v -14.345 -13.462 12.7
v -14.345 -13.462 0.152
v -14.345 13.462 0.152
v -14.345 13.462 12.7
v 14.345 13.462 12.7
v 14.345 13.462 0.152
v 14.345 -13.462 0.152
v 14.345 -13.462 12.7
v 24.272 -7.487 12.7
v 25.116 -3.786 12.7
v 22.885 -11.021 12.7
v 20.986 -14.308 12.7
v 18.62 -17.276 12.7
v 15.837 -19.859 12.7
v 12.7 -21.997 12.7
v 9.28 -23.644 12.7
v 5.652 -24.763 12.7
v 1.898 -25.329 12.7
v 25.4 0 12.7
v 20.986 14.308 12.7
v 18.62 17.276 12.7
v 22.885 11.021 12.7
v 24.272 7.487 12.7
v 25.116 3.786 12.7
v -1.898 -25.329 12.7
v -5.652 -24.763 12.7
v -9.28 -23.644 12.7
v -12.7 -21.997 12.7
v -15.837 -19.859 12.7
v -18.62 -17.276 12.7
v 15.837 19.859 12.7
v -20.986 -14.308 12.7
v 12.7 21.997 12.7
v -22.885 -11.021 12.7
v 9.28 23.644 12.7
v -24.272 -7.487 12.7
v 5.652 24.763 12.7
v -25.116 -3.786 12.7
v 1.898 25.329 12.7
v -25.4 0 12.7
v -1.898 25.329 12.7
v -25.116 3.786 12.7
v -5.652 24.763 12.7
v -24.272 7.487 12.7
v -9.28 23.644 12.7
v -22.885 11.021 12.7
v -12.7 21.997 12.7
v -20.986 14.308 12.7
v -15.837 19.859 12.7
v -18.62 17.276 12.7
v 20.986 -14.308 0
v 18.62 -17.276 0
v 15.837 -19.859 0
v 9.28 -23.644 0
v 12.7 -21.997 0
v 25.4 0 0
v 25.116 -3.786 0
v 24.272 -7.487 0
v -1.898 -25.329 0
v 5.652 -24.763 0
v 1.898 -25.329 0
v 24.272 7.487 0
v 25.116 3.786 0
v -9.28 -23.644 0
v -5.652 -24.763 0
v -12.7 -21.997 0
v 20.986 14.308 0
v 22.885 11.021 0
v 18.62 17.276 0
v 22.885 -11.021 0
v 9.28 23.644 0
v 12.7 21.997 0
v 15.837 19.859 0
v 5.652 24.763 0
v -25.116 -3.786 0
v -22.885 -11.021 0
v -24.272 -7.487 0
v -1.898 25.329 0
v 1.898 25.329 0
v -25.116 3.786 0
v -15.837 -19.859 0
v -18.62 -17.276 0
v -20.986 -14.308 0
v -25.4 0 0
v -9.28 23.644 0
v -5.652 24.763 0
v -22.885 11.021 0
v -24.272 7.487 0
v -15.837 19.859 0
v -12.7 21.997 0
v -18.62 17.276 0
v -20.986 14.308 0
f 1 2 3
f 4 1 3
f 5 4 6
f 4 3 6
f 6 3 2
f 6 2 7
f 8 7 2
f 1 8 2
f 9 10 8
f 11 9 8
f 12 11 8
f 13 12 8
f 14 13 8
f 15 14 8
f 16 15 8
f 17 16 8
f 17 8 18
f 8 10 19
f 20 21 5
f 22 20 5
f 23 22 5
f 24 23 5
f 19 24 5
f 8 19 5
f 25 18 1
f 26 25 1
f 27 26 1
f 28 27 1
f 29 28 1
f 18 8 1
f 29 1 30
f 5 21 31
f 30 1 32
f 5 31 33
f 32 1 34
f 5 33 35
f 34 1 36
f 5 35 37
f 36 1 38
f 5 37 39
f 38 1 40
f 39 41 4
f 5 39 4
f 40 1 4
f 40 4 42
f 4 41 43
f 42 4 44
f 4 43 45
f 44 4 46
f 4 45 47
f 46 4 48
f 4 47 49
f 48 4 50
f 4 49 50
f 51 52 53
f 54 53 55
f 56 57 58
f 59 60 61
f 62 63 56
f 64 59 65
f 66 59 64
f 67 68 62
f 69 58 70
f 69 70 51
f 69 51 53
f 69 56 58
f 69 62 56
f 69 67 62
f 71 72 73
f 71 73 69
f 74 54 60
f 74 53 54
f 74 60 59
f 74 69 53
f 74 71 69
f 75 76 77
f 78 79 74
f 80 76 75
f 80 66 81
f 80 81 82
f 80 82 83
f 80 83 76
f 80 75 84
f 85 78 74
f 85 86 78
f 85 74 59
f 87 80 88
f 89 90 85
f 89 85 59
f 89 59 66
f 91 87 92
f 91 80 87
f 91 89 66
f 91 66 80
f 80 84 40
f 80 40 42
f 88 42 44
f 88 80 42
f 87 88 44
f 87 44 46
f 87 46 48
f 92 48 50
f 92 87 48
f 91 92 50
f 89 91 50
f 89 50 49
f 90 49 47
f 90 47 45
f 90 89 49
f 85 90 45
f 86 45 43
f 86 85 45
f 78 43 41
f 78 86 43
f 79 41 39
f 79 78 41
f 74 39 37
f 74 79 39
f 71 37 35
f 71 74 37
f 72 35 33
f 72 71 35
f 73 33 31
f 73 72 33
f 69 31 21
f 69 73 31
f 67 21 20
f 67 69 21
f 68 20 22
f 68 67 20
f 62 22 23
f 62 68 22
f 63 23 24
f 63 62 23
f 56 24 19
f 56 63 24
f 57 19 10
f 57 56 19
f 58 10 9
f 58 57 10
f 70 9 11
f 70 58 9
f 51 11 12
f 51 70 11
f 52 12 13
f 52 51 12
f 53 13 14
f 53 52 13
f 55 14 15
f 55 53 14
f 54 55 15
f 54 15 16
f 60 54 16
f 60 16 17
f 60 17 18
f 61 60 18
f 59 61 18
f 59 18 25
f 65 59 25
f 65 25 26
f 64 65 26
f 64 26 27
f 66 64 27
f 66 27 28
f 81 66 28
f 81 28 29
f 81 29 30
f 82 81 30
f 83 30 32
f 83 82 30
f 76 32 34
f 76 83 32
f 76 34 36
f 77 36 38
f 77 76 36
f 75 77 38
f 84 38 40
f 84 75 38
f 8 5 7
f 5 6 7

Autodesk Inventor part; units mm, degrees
ref_plane "YZ Plane" through (0, 0, 0) normal (1, 0, 0) x (0, 1, 0)
ref_plane "XZ Plane" through (0, 0, 0) normal (0, 1, 0) x (-1, 0, 0)
ref_plane "XY Plane" through (0, 0, 0) normal (0, 0, 1) x (1, 0, 0)
sketch "Sketch1" plane through (0, 0, 0) normal (0, 0, 1) x (1, 0, 0)
  line L0 (-14.3446, 13.462) -> (14.3446, 13.462)
  line L1 (14.3446, 13.462) -> (14.3446, -13.462)
  line L2 (14.3446, -13.462) -> (-14.3446, -13.462)
  line L3 (-14.3446, -13.462) -> (-14.3446, 13.462)
  line L4 (-14.3446, 13.462) -> (14.3446, -13.462) construction
  line L5 (14.3446, 13.462) -> (-14.3446, -13.462) construction
  point P0 (0, 0)
  dimension "d0" = 28.6893
  dimension "d1" = 26.924
ref_plane "Work Plane1" through (0, 0, 0) normal (0, 0, -1) x (-1, 0, 0)
sketch "Sketch2" plane through (0, 0, 0) normal (0, 0, -1) x (-1, 0, 0)
  circle A0 centre (0, 0) radius 25.4
  dimension "d4" = 50.8
extrude "Extrusion2" add sketch "Sketch2" against normal blind 12.7
extrude "Extrusion3" cut sketch "Sketch1" along normal through all
sketch "Sketch3" plane through (0, 0, 0) normal (0, 0, 1) x (1, 0, 0)
  line L0 (-14.3446, -13.462) -> (14.3446, -13.462) projected
  line L1 (-14.3446, 13.462) -> (-14.3446, -13.462) projected
  line L2 (14.3446, 13.462) -> (-14.3446, 13.462) projected
  line L3 (14.3446, -13.462) -> (14.3446, 13.462) projected
  line L4 (-14.3446, 13.462) -> (-14.3446, -13.462) projected
  line L5 (-14.3446, -13.462) -> (14.3446, -13.462) projected
  line L6 (14.3446, -13.462) -> (14.3446, 13.462) projected
  line L7 (14.3446, 13.462) -> (-14.3446, 13.462) projected
  circle A0 centre (0, 0) radius 25.4 projected
  line L8 (-35.56, 0) -> (35.56, 0) projected
  line L9 (0, -35.56) -> (0, 35.56) projected
  line L10 (14.3446, 13.462) -> (-14.3446, 13.462) projected
  line L11 (-14.3446, -13.462) -> (14.3446, -13.462)
  line L12 (14.3446, -13.462) -> (14.3446, 13.462)
  line L13 (14.3446, 13.462) -> (-14.3446, 13.462)
  line L14 (-14.3446, 13.462) -> (-14.3446, -13.462)
  line L15 (-14.3446, -13.462) -> (14.3446, 13.462) construction
  line L16 (14.3446, -13.462) -> (-14.3446, 13.462) construction
  line L17 (14.3446, 13.462) -> (-14.3446, 13.462) projected
  line L18 (-14.3446, -13.462) -> (14.3447, -13.462)
  line L19 (14.3447, -13.462) -> (14.3446, 13.462)
  line L20 (14.3446, 13.462) -> (-14.3446, 13.462)
  line L21 (-14.3446, 13.462) -> (-14.3446, -13.462)
  line L22 (-14.3446, -13.462) -> (14.3446, 13.462) construction
  line L23 (14.3447, -13.462) -> (-14.3446, 13.462) construction
  line L24 (14.3446, -13.462) -> (14.3446, 13.462) projected
extrude "Extrusion4" add sketch "Sketch3" along normal blind 0.1524 contours L1 L8 L9 L0 | L9 L8 L3 L0 | L1 L2 L9 L8 | L9 L2 L3 L8
pattern_linear "Rectangular Pattern1" [suppressed]
sketch "Sketch4" plane through (0, 0, 0) normal (0, 0, 1) x (1, 0, 0)
  circle A0 centre (0, 0) radius 25.4 projected
  line L0 (-35.56, 0) -> (35.56, 0) projected
  line L1 (0, -35.56) -> (0, 35.56) projected
  line L2 (-14.3446, -13.462) -> (14.3446, -13.462) projected
  line L3 (13.5954, 13.462) -> (13.5954, -13.462) projected
  line L4 (-12.1856, -13.462) -> (13.5954, -13.462)
  line L5 (13.5954, -13.462) -> (13.5954, -0.254)
  line L6 (13.5954, -0.254) -> (-12.1857, -0.254)
  line L7 (-12.1857, -0.254) -> (-12.1856, -13.462)
  line L8 (13.2144, 13.462) -> (13.5954, 13.462)
  line L9 (10.6744, 13.462) -> (11.0554, 13.462)
  line L10 (8.1344, 13.462) -> (8.5154, 13.462)
  line L11 (5.5944, 13.462) -> (5.9754, 13.462)
  line L12 (3.0544, 13.462) -> (3.4354, 13.462)
  line L13 (0.5144, 13.462) -> (0.8954, 13.462)
  line L14 (-2.0256, 13.462) -> (-1.6446, 13.462)
  line L15 (-4.5656, 13.462) -> (-4.1846, 13.462)
  line L16 (-7.1056, 13.462) -> (-6.7246, 13.462)
  line L17 (-9.6456, 13.462) -> (-9.2646, 13.462)
  line L18 (-12.1856, 13.462) -> (-11.8046, 13.462)
  line L19 (-12.1856, 13.462) -> (-11.8046, 13.462)
  line L20 (-12.1856, 13.462) -> (13.5954, 13.462)
  line L21 (13.5954, 13.462) -> (13.5954, 0.254)
  line L22 (13.5954, 0.254) -> (-12.1857, 0.254)
  line L23 (-12.1857, 0.254) -> (-12.1856, 13.462)
  point P0 (-11.8046, -13.462)
  dimension "d15" = 0.254
extrude "Extrusion5" [suppressed]
sketch "Sketch5" plane through (0, 0, 0) normal (0, 0, -1) x (-1, 0, 0)
  circle A0 centre (0, 0) radius 25.4 projected
  line L0 (35.56, 0) -> (-35.56, 0) projected
  line L1 (0, -35.56) -> (0, 35.56) projected
  circle A1 centre (11.9952, -2.794) radius 0.5
  point P0 (11.9952, -0.254)
  dimension "d18" = 1
extrude "Extrusion6" [suppressed]
pattern_linear "Rectangular Pattern2" [suppressed]
mirror "Mirror1" [suppressed]
sketch "Sketch6" plane through (0, 0, 0) normal (0, 0, -1) x (-1, 0, 0)
  point P0 (0, 0)
equation "\"BendRadius\" = Thickness"
equation "\"BendReliefWidth\" = Thickness"
equation "\"BendReliefDepth\" = 0.5 * Thickness"
equation "\"CornerReliefSize\" = 4 * Thickness"
equation "\"MinimumRemnant\" = 2 * Thickness"
equation "\"TransitionRadius\" = BendRadius"
equation "\"JacobiRadiusSize\" = BendRadius"
equation "\"GapSize\" = Thickness"
equation "\"Thickness\" = 3.048"
properties part number "_3DPrint"
